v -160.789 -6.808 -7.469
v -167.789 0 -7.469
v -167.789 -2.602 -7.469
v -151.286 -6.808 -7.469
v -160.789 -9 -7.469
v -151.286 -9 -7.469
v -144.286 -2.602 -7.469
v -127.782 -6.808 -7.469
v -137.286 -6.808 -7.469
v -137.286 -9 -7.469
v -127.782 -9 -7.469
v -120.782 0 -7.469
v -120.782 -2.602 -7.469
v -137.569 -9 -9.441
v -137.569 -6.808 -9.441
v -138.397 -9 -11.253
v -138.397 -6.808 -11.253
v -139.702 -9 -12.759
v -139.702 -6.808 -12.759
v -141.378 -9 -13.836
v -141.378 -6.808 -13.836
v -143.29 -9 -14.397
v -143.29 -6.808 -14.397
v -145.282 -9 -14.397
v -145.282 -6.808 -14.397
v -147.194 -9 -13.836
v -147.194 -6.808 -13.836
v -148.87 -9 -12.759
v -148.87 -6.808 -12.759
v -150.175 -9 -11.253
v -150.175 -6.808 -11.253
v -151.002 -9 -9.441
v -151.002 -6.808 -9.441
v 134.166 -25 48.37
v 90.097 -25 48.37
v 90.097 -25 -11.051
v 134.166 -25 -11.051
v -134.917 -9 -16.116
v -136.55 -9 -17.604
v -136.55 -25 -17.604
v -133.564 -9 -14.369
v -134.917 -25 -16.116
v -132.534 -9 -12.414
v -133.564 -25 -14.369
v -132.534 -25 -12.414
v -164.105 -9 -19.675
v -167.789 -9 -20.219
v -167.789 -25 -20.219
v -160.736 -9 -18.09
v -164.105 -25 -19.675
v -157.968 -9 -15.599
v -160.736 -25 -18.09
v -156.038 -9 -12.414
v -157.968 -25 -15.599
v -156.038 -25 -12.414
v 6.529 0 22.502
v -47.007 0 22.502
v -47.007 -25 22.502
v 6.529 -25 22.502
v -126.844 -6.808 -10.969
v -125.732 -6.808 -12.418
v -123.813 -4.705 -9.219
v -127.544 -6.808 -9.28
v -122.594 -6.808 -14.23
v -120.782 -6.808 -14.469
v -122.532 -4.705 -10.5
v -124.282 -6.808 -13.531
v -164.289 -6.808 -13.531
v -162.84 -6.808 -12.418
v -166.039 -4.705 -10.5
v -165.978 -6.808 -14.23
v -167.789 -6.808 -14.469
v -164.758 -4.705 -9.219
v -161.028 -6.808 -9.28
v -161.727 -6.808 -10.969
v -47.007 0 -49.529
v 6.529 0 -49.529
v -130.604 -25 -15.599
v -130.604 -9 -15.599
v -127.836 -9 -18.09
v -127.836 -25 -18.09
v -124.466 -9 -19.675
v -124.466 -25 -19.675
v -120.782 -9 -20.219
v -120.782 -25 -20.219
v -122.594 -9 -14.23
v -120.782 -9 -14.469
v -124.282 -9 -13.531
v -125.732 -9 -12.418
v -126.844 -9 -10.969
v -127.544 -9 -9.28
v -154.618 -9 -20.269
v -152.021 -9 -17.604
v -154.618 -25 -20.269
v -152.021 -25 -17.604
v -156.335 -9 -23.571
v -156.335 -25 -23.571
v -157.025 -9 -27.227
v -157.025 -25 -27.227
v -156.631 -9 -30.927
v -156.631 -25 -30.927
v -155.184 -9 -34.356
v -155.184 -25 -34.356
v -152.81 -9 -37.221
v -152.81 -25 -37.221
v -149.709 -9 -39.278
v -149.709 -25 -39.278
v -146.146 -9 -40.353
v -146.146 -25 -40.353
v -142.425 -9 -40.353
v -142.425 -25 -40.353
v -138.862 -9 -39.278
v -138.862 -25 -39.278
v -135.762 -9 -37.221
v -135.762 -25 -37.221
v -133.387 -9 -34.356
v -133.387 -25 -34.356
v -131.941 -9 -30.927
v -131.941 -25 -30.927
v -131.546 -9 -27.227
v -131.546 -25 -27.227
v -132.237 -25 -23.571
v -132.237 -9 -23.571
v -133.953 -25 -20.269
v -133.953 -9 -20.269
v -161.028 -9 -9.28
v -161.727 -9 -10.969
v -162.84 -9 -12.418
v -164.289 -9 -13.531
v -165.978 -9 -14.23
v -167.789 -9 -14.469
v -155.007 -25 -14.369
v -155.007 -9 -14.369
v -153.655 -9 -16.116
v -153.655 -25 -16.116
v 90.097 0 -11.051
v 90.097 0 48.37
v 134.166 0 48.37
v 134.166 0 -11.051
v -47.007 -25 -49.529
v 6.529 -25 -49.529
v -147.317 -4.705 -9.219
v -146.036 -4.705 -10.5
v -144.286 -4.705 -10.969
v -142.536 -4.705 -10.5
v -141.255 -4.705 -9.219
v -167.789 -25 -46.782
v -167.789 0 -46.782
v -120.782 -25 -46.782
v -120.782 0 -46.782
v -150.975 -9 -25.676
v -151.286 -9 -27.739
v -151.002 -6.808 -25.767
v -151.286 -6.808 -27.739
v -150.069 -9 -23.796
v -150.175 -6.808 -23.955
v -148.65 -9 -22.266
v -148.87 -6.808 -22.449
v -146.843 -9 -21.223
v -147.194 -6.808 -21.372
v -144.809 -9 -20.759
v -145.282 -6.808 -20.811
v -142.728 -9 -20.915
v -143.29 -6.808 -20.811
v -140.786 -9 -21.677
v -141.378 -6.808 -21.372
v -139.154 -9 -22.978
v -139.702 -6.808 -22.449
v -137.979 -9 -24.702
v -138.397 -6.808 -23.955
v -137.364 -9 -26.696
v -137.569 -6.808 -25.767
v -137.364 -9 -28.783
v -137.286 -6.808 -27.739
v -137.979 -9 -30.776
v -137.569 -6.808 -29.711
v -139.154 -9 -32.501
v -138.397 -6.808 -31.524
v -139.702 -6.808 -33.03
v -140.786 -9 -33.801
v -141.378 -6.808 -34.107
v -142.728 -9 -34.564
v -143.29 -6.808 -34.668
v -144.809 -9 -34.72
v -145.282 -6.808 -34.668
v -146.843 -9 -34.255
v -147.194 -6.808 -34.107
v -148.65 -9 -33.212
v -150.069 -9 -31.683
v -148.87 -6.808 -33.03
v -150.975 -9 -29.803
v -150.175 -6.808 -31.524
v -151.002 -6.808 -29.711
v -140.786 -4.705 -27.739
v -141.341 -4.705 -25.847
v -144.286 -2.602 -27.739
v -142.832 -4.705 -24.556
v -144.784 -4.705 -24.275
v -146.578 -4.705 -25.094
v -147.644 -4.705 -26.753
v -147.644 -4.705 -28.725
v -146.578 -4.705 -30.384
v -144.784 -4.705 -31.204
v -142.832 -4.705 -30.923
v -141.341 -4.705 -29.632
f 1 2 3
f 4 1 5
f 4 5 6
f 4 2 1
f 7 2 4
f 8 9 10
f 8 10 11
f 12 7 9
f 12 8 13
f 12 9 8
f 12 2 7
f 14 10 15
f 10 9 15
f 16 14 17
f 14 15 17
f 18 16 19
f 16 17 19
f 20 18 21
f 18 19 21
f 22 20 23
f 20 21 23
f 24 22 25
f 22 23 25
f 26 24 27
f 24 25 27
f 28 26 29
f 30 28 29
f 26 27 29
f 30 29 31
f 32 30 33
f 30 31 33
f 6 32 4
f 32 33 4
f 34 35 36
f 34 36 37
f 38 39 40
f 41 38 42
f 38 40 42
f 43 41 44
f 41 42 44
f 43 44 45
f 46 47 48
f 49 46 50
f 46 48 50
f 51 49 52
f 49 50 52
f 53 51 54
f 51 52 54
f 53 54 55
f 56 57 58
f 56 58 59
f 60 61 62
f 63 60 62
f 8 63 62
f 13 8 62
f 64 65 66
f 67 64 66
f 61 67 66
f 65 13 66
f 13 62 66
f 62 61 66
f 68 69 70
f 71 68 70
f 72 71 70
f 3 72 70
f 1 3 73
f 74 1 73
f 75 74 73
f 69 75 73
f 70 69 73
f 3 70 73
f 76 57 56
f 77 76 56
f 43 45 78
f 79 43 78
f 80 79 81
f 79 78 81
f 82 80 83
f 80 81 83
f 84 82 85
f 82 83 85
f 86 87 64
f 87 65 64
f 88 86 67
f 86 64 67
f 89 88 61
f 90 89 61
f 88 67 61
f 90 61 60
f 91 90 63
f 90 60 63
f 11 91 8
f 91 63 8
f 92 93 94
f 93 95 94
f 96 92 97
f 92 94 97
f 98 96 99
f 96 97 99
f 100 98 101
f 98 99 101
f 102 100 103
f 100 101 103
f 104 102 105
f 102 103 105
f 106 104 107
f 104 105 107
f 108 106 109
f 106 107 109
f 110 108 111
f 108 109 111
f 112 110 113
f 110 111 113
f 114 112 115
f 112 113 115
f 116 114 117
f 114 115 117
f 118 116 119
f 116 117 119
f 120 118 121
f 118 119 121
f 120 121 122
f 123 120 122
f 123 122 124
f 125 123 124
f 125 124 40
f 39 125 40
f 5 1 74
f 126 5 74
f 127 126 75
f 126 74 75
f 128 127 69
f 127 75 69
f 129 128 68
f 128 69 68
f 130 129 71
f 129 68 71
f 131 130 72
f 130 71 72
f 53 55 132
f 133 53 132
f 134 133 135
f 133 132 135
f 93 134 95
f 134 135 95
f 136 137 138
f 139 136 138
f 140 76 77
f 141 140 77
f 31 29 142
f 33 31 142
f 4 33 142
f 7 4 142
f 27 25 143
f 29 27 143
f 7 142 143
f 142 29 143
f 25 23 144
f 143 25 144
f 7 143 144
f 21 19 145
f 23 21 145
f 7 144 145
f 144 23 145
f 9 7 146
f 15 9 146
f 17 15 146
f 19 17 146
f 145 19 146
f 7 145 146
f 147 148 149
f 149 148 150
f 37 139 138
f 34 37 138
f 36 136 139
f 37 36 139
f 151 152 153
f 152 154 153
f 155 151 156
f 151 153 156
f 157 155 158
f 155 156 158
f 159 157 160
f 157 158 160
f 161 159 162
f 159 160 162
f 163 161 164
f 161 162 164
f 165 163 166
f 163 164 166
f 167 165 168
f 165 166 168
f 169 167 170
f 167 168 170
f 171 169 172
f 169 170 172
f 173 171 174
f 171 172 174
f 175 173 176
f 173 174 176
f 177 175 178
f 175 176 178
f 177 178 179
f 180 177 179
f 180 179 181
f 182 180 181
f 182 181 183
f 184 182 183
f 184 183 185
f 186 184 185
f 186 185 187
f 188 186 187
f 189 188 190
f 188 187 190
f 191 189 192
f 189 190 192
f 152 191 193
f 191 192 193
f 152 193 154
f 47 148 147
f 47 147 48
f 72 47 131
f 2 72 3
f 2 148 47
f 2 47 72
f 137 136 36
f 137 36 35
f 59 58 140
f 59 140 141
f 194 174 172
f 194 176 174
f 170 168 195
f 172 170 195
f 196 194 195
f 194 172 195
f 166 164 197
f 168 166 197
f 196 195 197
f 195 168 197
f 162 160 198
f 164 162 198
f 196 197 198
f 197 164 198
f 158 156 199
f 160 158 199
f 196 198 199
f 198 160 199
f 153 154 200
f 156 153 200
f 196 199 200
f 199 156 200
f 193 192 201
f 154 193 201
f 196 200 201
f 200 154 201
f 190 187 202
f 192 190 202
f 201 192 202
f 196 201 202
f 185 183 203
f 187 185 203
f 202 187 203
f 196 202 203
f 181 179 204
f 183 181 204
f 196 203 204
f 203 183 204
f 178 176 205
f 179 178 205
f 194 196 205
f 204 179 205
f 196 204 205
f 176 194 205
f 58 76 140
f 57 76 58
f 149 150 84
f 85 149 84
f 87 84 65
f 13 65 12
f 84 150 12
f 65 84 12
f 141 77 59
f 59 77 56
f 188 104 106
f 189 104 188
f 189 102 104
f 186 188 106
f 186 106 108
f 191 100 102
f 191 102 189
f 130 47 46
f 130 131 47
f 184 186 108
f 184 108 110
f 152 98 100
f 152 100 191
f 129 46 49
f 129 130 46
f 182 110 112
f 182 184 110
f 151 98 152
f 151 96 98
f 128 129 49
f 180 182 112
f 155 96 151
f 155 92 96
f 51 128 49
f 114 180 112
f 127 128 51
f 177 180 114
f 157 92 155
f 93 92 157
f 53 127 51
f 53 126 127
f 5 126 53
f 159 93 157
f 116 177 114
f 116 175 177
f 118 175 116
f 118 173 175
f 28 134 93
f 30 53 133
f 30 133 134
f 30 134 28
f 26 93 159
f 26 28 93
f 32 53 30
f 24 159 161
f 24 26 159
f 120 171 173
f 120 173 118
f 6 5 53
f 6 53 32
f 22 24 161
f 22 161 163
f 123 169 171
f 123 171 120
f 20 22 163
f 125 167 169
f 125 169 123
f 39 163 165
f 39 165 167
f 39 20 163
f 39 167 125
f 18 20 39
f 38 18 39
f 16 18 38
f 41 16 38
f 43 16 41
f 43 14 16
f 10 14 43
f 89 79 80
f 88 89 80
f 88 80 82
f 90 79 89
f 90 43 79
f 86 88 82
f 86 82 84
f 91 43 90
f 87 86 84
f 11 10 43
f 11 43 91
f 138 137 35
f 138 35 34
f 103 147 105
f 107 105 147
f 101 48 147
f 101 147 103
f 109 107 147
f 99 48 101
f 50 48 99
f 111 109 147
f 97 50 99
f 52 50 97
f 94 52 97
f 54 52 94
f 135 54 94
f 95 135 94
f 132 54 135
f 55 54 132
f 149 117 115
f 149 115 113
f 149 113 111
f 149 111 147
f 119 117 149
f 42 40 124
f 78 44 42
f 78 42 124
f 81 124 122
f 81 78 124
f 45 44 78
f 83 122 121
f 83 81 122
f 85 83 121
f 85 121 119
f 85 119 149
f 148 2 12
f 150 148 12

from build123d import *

# Parameters (mm, degrees)
F0_W           = 47.0071360469
F0_H           = 39.3132301979
F1_DEPTH       = 25
F0_W_2         = 53.5358963534
F0_H_2         = 72.0310099423
F0_W_3         = 44.069185853
F0_H_3         = 59.4212077558
F3_D           = 14
F3_DEPTH       = 18.192
F3_CBORE_D     = 25.5
F3_CBORE_DEPTH = 16
F3_TIP         = 4.2060243332


with BuildPart() as f1:
    # F0 (on Front) → F1 (new body)
    with BuildSketch(Plane.XZ):
        with Locations((-144.2857719958, -27.1252079401)):
            Rectangle(F0_W, F0_H)
    extrude(amount=F1_DEPTH)

    # F3
    with Locations(Plane.XZ.offset(25)):
        with Locations((-167.7893400192, -7.4685928412), (-144.2857719958, -7.4685928412), (-120.7822039723, -7.4685928412), (-144.2857719958, -27.7392920107)):
            CounterBoreHole(F3_D / 2, F3_CBORE_D / 2, F3_CBORE_DEPTH, depth=F3_DEPTH)
            with Locations((0, 0, -(F3_DEPTH + F3_TIP / 2))):  # 118° drill point
                Cone(0, F3_D / 2, F3_TIP, mode=Mode.SUBTRACT)


with BuildPart() as f1b:
    # F0 (on Front) → F1, piece 2 (new body)
    with BuildSketch(Plane.XZ):
        with Locations((-20.2391804196, -13.5138500482)):
            Rectangle(F0_W_2, F0_H_2)
    extrude(amount=F1_DEPTH)


with BuildPart() as f1c:
    # F0 (on Front) → F1, piece 3 (new body)
    with BuildSketch(Plane.XZ):
        with Locations((112.131588161, 18.6591874808)):
            Rectangle(F0_W_3, F0_H_3)
    extrude(amount=F1_DEPTH)


solid = Compound([f1.part, f1b.part, f1c.part])
